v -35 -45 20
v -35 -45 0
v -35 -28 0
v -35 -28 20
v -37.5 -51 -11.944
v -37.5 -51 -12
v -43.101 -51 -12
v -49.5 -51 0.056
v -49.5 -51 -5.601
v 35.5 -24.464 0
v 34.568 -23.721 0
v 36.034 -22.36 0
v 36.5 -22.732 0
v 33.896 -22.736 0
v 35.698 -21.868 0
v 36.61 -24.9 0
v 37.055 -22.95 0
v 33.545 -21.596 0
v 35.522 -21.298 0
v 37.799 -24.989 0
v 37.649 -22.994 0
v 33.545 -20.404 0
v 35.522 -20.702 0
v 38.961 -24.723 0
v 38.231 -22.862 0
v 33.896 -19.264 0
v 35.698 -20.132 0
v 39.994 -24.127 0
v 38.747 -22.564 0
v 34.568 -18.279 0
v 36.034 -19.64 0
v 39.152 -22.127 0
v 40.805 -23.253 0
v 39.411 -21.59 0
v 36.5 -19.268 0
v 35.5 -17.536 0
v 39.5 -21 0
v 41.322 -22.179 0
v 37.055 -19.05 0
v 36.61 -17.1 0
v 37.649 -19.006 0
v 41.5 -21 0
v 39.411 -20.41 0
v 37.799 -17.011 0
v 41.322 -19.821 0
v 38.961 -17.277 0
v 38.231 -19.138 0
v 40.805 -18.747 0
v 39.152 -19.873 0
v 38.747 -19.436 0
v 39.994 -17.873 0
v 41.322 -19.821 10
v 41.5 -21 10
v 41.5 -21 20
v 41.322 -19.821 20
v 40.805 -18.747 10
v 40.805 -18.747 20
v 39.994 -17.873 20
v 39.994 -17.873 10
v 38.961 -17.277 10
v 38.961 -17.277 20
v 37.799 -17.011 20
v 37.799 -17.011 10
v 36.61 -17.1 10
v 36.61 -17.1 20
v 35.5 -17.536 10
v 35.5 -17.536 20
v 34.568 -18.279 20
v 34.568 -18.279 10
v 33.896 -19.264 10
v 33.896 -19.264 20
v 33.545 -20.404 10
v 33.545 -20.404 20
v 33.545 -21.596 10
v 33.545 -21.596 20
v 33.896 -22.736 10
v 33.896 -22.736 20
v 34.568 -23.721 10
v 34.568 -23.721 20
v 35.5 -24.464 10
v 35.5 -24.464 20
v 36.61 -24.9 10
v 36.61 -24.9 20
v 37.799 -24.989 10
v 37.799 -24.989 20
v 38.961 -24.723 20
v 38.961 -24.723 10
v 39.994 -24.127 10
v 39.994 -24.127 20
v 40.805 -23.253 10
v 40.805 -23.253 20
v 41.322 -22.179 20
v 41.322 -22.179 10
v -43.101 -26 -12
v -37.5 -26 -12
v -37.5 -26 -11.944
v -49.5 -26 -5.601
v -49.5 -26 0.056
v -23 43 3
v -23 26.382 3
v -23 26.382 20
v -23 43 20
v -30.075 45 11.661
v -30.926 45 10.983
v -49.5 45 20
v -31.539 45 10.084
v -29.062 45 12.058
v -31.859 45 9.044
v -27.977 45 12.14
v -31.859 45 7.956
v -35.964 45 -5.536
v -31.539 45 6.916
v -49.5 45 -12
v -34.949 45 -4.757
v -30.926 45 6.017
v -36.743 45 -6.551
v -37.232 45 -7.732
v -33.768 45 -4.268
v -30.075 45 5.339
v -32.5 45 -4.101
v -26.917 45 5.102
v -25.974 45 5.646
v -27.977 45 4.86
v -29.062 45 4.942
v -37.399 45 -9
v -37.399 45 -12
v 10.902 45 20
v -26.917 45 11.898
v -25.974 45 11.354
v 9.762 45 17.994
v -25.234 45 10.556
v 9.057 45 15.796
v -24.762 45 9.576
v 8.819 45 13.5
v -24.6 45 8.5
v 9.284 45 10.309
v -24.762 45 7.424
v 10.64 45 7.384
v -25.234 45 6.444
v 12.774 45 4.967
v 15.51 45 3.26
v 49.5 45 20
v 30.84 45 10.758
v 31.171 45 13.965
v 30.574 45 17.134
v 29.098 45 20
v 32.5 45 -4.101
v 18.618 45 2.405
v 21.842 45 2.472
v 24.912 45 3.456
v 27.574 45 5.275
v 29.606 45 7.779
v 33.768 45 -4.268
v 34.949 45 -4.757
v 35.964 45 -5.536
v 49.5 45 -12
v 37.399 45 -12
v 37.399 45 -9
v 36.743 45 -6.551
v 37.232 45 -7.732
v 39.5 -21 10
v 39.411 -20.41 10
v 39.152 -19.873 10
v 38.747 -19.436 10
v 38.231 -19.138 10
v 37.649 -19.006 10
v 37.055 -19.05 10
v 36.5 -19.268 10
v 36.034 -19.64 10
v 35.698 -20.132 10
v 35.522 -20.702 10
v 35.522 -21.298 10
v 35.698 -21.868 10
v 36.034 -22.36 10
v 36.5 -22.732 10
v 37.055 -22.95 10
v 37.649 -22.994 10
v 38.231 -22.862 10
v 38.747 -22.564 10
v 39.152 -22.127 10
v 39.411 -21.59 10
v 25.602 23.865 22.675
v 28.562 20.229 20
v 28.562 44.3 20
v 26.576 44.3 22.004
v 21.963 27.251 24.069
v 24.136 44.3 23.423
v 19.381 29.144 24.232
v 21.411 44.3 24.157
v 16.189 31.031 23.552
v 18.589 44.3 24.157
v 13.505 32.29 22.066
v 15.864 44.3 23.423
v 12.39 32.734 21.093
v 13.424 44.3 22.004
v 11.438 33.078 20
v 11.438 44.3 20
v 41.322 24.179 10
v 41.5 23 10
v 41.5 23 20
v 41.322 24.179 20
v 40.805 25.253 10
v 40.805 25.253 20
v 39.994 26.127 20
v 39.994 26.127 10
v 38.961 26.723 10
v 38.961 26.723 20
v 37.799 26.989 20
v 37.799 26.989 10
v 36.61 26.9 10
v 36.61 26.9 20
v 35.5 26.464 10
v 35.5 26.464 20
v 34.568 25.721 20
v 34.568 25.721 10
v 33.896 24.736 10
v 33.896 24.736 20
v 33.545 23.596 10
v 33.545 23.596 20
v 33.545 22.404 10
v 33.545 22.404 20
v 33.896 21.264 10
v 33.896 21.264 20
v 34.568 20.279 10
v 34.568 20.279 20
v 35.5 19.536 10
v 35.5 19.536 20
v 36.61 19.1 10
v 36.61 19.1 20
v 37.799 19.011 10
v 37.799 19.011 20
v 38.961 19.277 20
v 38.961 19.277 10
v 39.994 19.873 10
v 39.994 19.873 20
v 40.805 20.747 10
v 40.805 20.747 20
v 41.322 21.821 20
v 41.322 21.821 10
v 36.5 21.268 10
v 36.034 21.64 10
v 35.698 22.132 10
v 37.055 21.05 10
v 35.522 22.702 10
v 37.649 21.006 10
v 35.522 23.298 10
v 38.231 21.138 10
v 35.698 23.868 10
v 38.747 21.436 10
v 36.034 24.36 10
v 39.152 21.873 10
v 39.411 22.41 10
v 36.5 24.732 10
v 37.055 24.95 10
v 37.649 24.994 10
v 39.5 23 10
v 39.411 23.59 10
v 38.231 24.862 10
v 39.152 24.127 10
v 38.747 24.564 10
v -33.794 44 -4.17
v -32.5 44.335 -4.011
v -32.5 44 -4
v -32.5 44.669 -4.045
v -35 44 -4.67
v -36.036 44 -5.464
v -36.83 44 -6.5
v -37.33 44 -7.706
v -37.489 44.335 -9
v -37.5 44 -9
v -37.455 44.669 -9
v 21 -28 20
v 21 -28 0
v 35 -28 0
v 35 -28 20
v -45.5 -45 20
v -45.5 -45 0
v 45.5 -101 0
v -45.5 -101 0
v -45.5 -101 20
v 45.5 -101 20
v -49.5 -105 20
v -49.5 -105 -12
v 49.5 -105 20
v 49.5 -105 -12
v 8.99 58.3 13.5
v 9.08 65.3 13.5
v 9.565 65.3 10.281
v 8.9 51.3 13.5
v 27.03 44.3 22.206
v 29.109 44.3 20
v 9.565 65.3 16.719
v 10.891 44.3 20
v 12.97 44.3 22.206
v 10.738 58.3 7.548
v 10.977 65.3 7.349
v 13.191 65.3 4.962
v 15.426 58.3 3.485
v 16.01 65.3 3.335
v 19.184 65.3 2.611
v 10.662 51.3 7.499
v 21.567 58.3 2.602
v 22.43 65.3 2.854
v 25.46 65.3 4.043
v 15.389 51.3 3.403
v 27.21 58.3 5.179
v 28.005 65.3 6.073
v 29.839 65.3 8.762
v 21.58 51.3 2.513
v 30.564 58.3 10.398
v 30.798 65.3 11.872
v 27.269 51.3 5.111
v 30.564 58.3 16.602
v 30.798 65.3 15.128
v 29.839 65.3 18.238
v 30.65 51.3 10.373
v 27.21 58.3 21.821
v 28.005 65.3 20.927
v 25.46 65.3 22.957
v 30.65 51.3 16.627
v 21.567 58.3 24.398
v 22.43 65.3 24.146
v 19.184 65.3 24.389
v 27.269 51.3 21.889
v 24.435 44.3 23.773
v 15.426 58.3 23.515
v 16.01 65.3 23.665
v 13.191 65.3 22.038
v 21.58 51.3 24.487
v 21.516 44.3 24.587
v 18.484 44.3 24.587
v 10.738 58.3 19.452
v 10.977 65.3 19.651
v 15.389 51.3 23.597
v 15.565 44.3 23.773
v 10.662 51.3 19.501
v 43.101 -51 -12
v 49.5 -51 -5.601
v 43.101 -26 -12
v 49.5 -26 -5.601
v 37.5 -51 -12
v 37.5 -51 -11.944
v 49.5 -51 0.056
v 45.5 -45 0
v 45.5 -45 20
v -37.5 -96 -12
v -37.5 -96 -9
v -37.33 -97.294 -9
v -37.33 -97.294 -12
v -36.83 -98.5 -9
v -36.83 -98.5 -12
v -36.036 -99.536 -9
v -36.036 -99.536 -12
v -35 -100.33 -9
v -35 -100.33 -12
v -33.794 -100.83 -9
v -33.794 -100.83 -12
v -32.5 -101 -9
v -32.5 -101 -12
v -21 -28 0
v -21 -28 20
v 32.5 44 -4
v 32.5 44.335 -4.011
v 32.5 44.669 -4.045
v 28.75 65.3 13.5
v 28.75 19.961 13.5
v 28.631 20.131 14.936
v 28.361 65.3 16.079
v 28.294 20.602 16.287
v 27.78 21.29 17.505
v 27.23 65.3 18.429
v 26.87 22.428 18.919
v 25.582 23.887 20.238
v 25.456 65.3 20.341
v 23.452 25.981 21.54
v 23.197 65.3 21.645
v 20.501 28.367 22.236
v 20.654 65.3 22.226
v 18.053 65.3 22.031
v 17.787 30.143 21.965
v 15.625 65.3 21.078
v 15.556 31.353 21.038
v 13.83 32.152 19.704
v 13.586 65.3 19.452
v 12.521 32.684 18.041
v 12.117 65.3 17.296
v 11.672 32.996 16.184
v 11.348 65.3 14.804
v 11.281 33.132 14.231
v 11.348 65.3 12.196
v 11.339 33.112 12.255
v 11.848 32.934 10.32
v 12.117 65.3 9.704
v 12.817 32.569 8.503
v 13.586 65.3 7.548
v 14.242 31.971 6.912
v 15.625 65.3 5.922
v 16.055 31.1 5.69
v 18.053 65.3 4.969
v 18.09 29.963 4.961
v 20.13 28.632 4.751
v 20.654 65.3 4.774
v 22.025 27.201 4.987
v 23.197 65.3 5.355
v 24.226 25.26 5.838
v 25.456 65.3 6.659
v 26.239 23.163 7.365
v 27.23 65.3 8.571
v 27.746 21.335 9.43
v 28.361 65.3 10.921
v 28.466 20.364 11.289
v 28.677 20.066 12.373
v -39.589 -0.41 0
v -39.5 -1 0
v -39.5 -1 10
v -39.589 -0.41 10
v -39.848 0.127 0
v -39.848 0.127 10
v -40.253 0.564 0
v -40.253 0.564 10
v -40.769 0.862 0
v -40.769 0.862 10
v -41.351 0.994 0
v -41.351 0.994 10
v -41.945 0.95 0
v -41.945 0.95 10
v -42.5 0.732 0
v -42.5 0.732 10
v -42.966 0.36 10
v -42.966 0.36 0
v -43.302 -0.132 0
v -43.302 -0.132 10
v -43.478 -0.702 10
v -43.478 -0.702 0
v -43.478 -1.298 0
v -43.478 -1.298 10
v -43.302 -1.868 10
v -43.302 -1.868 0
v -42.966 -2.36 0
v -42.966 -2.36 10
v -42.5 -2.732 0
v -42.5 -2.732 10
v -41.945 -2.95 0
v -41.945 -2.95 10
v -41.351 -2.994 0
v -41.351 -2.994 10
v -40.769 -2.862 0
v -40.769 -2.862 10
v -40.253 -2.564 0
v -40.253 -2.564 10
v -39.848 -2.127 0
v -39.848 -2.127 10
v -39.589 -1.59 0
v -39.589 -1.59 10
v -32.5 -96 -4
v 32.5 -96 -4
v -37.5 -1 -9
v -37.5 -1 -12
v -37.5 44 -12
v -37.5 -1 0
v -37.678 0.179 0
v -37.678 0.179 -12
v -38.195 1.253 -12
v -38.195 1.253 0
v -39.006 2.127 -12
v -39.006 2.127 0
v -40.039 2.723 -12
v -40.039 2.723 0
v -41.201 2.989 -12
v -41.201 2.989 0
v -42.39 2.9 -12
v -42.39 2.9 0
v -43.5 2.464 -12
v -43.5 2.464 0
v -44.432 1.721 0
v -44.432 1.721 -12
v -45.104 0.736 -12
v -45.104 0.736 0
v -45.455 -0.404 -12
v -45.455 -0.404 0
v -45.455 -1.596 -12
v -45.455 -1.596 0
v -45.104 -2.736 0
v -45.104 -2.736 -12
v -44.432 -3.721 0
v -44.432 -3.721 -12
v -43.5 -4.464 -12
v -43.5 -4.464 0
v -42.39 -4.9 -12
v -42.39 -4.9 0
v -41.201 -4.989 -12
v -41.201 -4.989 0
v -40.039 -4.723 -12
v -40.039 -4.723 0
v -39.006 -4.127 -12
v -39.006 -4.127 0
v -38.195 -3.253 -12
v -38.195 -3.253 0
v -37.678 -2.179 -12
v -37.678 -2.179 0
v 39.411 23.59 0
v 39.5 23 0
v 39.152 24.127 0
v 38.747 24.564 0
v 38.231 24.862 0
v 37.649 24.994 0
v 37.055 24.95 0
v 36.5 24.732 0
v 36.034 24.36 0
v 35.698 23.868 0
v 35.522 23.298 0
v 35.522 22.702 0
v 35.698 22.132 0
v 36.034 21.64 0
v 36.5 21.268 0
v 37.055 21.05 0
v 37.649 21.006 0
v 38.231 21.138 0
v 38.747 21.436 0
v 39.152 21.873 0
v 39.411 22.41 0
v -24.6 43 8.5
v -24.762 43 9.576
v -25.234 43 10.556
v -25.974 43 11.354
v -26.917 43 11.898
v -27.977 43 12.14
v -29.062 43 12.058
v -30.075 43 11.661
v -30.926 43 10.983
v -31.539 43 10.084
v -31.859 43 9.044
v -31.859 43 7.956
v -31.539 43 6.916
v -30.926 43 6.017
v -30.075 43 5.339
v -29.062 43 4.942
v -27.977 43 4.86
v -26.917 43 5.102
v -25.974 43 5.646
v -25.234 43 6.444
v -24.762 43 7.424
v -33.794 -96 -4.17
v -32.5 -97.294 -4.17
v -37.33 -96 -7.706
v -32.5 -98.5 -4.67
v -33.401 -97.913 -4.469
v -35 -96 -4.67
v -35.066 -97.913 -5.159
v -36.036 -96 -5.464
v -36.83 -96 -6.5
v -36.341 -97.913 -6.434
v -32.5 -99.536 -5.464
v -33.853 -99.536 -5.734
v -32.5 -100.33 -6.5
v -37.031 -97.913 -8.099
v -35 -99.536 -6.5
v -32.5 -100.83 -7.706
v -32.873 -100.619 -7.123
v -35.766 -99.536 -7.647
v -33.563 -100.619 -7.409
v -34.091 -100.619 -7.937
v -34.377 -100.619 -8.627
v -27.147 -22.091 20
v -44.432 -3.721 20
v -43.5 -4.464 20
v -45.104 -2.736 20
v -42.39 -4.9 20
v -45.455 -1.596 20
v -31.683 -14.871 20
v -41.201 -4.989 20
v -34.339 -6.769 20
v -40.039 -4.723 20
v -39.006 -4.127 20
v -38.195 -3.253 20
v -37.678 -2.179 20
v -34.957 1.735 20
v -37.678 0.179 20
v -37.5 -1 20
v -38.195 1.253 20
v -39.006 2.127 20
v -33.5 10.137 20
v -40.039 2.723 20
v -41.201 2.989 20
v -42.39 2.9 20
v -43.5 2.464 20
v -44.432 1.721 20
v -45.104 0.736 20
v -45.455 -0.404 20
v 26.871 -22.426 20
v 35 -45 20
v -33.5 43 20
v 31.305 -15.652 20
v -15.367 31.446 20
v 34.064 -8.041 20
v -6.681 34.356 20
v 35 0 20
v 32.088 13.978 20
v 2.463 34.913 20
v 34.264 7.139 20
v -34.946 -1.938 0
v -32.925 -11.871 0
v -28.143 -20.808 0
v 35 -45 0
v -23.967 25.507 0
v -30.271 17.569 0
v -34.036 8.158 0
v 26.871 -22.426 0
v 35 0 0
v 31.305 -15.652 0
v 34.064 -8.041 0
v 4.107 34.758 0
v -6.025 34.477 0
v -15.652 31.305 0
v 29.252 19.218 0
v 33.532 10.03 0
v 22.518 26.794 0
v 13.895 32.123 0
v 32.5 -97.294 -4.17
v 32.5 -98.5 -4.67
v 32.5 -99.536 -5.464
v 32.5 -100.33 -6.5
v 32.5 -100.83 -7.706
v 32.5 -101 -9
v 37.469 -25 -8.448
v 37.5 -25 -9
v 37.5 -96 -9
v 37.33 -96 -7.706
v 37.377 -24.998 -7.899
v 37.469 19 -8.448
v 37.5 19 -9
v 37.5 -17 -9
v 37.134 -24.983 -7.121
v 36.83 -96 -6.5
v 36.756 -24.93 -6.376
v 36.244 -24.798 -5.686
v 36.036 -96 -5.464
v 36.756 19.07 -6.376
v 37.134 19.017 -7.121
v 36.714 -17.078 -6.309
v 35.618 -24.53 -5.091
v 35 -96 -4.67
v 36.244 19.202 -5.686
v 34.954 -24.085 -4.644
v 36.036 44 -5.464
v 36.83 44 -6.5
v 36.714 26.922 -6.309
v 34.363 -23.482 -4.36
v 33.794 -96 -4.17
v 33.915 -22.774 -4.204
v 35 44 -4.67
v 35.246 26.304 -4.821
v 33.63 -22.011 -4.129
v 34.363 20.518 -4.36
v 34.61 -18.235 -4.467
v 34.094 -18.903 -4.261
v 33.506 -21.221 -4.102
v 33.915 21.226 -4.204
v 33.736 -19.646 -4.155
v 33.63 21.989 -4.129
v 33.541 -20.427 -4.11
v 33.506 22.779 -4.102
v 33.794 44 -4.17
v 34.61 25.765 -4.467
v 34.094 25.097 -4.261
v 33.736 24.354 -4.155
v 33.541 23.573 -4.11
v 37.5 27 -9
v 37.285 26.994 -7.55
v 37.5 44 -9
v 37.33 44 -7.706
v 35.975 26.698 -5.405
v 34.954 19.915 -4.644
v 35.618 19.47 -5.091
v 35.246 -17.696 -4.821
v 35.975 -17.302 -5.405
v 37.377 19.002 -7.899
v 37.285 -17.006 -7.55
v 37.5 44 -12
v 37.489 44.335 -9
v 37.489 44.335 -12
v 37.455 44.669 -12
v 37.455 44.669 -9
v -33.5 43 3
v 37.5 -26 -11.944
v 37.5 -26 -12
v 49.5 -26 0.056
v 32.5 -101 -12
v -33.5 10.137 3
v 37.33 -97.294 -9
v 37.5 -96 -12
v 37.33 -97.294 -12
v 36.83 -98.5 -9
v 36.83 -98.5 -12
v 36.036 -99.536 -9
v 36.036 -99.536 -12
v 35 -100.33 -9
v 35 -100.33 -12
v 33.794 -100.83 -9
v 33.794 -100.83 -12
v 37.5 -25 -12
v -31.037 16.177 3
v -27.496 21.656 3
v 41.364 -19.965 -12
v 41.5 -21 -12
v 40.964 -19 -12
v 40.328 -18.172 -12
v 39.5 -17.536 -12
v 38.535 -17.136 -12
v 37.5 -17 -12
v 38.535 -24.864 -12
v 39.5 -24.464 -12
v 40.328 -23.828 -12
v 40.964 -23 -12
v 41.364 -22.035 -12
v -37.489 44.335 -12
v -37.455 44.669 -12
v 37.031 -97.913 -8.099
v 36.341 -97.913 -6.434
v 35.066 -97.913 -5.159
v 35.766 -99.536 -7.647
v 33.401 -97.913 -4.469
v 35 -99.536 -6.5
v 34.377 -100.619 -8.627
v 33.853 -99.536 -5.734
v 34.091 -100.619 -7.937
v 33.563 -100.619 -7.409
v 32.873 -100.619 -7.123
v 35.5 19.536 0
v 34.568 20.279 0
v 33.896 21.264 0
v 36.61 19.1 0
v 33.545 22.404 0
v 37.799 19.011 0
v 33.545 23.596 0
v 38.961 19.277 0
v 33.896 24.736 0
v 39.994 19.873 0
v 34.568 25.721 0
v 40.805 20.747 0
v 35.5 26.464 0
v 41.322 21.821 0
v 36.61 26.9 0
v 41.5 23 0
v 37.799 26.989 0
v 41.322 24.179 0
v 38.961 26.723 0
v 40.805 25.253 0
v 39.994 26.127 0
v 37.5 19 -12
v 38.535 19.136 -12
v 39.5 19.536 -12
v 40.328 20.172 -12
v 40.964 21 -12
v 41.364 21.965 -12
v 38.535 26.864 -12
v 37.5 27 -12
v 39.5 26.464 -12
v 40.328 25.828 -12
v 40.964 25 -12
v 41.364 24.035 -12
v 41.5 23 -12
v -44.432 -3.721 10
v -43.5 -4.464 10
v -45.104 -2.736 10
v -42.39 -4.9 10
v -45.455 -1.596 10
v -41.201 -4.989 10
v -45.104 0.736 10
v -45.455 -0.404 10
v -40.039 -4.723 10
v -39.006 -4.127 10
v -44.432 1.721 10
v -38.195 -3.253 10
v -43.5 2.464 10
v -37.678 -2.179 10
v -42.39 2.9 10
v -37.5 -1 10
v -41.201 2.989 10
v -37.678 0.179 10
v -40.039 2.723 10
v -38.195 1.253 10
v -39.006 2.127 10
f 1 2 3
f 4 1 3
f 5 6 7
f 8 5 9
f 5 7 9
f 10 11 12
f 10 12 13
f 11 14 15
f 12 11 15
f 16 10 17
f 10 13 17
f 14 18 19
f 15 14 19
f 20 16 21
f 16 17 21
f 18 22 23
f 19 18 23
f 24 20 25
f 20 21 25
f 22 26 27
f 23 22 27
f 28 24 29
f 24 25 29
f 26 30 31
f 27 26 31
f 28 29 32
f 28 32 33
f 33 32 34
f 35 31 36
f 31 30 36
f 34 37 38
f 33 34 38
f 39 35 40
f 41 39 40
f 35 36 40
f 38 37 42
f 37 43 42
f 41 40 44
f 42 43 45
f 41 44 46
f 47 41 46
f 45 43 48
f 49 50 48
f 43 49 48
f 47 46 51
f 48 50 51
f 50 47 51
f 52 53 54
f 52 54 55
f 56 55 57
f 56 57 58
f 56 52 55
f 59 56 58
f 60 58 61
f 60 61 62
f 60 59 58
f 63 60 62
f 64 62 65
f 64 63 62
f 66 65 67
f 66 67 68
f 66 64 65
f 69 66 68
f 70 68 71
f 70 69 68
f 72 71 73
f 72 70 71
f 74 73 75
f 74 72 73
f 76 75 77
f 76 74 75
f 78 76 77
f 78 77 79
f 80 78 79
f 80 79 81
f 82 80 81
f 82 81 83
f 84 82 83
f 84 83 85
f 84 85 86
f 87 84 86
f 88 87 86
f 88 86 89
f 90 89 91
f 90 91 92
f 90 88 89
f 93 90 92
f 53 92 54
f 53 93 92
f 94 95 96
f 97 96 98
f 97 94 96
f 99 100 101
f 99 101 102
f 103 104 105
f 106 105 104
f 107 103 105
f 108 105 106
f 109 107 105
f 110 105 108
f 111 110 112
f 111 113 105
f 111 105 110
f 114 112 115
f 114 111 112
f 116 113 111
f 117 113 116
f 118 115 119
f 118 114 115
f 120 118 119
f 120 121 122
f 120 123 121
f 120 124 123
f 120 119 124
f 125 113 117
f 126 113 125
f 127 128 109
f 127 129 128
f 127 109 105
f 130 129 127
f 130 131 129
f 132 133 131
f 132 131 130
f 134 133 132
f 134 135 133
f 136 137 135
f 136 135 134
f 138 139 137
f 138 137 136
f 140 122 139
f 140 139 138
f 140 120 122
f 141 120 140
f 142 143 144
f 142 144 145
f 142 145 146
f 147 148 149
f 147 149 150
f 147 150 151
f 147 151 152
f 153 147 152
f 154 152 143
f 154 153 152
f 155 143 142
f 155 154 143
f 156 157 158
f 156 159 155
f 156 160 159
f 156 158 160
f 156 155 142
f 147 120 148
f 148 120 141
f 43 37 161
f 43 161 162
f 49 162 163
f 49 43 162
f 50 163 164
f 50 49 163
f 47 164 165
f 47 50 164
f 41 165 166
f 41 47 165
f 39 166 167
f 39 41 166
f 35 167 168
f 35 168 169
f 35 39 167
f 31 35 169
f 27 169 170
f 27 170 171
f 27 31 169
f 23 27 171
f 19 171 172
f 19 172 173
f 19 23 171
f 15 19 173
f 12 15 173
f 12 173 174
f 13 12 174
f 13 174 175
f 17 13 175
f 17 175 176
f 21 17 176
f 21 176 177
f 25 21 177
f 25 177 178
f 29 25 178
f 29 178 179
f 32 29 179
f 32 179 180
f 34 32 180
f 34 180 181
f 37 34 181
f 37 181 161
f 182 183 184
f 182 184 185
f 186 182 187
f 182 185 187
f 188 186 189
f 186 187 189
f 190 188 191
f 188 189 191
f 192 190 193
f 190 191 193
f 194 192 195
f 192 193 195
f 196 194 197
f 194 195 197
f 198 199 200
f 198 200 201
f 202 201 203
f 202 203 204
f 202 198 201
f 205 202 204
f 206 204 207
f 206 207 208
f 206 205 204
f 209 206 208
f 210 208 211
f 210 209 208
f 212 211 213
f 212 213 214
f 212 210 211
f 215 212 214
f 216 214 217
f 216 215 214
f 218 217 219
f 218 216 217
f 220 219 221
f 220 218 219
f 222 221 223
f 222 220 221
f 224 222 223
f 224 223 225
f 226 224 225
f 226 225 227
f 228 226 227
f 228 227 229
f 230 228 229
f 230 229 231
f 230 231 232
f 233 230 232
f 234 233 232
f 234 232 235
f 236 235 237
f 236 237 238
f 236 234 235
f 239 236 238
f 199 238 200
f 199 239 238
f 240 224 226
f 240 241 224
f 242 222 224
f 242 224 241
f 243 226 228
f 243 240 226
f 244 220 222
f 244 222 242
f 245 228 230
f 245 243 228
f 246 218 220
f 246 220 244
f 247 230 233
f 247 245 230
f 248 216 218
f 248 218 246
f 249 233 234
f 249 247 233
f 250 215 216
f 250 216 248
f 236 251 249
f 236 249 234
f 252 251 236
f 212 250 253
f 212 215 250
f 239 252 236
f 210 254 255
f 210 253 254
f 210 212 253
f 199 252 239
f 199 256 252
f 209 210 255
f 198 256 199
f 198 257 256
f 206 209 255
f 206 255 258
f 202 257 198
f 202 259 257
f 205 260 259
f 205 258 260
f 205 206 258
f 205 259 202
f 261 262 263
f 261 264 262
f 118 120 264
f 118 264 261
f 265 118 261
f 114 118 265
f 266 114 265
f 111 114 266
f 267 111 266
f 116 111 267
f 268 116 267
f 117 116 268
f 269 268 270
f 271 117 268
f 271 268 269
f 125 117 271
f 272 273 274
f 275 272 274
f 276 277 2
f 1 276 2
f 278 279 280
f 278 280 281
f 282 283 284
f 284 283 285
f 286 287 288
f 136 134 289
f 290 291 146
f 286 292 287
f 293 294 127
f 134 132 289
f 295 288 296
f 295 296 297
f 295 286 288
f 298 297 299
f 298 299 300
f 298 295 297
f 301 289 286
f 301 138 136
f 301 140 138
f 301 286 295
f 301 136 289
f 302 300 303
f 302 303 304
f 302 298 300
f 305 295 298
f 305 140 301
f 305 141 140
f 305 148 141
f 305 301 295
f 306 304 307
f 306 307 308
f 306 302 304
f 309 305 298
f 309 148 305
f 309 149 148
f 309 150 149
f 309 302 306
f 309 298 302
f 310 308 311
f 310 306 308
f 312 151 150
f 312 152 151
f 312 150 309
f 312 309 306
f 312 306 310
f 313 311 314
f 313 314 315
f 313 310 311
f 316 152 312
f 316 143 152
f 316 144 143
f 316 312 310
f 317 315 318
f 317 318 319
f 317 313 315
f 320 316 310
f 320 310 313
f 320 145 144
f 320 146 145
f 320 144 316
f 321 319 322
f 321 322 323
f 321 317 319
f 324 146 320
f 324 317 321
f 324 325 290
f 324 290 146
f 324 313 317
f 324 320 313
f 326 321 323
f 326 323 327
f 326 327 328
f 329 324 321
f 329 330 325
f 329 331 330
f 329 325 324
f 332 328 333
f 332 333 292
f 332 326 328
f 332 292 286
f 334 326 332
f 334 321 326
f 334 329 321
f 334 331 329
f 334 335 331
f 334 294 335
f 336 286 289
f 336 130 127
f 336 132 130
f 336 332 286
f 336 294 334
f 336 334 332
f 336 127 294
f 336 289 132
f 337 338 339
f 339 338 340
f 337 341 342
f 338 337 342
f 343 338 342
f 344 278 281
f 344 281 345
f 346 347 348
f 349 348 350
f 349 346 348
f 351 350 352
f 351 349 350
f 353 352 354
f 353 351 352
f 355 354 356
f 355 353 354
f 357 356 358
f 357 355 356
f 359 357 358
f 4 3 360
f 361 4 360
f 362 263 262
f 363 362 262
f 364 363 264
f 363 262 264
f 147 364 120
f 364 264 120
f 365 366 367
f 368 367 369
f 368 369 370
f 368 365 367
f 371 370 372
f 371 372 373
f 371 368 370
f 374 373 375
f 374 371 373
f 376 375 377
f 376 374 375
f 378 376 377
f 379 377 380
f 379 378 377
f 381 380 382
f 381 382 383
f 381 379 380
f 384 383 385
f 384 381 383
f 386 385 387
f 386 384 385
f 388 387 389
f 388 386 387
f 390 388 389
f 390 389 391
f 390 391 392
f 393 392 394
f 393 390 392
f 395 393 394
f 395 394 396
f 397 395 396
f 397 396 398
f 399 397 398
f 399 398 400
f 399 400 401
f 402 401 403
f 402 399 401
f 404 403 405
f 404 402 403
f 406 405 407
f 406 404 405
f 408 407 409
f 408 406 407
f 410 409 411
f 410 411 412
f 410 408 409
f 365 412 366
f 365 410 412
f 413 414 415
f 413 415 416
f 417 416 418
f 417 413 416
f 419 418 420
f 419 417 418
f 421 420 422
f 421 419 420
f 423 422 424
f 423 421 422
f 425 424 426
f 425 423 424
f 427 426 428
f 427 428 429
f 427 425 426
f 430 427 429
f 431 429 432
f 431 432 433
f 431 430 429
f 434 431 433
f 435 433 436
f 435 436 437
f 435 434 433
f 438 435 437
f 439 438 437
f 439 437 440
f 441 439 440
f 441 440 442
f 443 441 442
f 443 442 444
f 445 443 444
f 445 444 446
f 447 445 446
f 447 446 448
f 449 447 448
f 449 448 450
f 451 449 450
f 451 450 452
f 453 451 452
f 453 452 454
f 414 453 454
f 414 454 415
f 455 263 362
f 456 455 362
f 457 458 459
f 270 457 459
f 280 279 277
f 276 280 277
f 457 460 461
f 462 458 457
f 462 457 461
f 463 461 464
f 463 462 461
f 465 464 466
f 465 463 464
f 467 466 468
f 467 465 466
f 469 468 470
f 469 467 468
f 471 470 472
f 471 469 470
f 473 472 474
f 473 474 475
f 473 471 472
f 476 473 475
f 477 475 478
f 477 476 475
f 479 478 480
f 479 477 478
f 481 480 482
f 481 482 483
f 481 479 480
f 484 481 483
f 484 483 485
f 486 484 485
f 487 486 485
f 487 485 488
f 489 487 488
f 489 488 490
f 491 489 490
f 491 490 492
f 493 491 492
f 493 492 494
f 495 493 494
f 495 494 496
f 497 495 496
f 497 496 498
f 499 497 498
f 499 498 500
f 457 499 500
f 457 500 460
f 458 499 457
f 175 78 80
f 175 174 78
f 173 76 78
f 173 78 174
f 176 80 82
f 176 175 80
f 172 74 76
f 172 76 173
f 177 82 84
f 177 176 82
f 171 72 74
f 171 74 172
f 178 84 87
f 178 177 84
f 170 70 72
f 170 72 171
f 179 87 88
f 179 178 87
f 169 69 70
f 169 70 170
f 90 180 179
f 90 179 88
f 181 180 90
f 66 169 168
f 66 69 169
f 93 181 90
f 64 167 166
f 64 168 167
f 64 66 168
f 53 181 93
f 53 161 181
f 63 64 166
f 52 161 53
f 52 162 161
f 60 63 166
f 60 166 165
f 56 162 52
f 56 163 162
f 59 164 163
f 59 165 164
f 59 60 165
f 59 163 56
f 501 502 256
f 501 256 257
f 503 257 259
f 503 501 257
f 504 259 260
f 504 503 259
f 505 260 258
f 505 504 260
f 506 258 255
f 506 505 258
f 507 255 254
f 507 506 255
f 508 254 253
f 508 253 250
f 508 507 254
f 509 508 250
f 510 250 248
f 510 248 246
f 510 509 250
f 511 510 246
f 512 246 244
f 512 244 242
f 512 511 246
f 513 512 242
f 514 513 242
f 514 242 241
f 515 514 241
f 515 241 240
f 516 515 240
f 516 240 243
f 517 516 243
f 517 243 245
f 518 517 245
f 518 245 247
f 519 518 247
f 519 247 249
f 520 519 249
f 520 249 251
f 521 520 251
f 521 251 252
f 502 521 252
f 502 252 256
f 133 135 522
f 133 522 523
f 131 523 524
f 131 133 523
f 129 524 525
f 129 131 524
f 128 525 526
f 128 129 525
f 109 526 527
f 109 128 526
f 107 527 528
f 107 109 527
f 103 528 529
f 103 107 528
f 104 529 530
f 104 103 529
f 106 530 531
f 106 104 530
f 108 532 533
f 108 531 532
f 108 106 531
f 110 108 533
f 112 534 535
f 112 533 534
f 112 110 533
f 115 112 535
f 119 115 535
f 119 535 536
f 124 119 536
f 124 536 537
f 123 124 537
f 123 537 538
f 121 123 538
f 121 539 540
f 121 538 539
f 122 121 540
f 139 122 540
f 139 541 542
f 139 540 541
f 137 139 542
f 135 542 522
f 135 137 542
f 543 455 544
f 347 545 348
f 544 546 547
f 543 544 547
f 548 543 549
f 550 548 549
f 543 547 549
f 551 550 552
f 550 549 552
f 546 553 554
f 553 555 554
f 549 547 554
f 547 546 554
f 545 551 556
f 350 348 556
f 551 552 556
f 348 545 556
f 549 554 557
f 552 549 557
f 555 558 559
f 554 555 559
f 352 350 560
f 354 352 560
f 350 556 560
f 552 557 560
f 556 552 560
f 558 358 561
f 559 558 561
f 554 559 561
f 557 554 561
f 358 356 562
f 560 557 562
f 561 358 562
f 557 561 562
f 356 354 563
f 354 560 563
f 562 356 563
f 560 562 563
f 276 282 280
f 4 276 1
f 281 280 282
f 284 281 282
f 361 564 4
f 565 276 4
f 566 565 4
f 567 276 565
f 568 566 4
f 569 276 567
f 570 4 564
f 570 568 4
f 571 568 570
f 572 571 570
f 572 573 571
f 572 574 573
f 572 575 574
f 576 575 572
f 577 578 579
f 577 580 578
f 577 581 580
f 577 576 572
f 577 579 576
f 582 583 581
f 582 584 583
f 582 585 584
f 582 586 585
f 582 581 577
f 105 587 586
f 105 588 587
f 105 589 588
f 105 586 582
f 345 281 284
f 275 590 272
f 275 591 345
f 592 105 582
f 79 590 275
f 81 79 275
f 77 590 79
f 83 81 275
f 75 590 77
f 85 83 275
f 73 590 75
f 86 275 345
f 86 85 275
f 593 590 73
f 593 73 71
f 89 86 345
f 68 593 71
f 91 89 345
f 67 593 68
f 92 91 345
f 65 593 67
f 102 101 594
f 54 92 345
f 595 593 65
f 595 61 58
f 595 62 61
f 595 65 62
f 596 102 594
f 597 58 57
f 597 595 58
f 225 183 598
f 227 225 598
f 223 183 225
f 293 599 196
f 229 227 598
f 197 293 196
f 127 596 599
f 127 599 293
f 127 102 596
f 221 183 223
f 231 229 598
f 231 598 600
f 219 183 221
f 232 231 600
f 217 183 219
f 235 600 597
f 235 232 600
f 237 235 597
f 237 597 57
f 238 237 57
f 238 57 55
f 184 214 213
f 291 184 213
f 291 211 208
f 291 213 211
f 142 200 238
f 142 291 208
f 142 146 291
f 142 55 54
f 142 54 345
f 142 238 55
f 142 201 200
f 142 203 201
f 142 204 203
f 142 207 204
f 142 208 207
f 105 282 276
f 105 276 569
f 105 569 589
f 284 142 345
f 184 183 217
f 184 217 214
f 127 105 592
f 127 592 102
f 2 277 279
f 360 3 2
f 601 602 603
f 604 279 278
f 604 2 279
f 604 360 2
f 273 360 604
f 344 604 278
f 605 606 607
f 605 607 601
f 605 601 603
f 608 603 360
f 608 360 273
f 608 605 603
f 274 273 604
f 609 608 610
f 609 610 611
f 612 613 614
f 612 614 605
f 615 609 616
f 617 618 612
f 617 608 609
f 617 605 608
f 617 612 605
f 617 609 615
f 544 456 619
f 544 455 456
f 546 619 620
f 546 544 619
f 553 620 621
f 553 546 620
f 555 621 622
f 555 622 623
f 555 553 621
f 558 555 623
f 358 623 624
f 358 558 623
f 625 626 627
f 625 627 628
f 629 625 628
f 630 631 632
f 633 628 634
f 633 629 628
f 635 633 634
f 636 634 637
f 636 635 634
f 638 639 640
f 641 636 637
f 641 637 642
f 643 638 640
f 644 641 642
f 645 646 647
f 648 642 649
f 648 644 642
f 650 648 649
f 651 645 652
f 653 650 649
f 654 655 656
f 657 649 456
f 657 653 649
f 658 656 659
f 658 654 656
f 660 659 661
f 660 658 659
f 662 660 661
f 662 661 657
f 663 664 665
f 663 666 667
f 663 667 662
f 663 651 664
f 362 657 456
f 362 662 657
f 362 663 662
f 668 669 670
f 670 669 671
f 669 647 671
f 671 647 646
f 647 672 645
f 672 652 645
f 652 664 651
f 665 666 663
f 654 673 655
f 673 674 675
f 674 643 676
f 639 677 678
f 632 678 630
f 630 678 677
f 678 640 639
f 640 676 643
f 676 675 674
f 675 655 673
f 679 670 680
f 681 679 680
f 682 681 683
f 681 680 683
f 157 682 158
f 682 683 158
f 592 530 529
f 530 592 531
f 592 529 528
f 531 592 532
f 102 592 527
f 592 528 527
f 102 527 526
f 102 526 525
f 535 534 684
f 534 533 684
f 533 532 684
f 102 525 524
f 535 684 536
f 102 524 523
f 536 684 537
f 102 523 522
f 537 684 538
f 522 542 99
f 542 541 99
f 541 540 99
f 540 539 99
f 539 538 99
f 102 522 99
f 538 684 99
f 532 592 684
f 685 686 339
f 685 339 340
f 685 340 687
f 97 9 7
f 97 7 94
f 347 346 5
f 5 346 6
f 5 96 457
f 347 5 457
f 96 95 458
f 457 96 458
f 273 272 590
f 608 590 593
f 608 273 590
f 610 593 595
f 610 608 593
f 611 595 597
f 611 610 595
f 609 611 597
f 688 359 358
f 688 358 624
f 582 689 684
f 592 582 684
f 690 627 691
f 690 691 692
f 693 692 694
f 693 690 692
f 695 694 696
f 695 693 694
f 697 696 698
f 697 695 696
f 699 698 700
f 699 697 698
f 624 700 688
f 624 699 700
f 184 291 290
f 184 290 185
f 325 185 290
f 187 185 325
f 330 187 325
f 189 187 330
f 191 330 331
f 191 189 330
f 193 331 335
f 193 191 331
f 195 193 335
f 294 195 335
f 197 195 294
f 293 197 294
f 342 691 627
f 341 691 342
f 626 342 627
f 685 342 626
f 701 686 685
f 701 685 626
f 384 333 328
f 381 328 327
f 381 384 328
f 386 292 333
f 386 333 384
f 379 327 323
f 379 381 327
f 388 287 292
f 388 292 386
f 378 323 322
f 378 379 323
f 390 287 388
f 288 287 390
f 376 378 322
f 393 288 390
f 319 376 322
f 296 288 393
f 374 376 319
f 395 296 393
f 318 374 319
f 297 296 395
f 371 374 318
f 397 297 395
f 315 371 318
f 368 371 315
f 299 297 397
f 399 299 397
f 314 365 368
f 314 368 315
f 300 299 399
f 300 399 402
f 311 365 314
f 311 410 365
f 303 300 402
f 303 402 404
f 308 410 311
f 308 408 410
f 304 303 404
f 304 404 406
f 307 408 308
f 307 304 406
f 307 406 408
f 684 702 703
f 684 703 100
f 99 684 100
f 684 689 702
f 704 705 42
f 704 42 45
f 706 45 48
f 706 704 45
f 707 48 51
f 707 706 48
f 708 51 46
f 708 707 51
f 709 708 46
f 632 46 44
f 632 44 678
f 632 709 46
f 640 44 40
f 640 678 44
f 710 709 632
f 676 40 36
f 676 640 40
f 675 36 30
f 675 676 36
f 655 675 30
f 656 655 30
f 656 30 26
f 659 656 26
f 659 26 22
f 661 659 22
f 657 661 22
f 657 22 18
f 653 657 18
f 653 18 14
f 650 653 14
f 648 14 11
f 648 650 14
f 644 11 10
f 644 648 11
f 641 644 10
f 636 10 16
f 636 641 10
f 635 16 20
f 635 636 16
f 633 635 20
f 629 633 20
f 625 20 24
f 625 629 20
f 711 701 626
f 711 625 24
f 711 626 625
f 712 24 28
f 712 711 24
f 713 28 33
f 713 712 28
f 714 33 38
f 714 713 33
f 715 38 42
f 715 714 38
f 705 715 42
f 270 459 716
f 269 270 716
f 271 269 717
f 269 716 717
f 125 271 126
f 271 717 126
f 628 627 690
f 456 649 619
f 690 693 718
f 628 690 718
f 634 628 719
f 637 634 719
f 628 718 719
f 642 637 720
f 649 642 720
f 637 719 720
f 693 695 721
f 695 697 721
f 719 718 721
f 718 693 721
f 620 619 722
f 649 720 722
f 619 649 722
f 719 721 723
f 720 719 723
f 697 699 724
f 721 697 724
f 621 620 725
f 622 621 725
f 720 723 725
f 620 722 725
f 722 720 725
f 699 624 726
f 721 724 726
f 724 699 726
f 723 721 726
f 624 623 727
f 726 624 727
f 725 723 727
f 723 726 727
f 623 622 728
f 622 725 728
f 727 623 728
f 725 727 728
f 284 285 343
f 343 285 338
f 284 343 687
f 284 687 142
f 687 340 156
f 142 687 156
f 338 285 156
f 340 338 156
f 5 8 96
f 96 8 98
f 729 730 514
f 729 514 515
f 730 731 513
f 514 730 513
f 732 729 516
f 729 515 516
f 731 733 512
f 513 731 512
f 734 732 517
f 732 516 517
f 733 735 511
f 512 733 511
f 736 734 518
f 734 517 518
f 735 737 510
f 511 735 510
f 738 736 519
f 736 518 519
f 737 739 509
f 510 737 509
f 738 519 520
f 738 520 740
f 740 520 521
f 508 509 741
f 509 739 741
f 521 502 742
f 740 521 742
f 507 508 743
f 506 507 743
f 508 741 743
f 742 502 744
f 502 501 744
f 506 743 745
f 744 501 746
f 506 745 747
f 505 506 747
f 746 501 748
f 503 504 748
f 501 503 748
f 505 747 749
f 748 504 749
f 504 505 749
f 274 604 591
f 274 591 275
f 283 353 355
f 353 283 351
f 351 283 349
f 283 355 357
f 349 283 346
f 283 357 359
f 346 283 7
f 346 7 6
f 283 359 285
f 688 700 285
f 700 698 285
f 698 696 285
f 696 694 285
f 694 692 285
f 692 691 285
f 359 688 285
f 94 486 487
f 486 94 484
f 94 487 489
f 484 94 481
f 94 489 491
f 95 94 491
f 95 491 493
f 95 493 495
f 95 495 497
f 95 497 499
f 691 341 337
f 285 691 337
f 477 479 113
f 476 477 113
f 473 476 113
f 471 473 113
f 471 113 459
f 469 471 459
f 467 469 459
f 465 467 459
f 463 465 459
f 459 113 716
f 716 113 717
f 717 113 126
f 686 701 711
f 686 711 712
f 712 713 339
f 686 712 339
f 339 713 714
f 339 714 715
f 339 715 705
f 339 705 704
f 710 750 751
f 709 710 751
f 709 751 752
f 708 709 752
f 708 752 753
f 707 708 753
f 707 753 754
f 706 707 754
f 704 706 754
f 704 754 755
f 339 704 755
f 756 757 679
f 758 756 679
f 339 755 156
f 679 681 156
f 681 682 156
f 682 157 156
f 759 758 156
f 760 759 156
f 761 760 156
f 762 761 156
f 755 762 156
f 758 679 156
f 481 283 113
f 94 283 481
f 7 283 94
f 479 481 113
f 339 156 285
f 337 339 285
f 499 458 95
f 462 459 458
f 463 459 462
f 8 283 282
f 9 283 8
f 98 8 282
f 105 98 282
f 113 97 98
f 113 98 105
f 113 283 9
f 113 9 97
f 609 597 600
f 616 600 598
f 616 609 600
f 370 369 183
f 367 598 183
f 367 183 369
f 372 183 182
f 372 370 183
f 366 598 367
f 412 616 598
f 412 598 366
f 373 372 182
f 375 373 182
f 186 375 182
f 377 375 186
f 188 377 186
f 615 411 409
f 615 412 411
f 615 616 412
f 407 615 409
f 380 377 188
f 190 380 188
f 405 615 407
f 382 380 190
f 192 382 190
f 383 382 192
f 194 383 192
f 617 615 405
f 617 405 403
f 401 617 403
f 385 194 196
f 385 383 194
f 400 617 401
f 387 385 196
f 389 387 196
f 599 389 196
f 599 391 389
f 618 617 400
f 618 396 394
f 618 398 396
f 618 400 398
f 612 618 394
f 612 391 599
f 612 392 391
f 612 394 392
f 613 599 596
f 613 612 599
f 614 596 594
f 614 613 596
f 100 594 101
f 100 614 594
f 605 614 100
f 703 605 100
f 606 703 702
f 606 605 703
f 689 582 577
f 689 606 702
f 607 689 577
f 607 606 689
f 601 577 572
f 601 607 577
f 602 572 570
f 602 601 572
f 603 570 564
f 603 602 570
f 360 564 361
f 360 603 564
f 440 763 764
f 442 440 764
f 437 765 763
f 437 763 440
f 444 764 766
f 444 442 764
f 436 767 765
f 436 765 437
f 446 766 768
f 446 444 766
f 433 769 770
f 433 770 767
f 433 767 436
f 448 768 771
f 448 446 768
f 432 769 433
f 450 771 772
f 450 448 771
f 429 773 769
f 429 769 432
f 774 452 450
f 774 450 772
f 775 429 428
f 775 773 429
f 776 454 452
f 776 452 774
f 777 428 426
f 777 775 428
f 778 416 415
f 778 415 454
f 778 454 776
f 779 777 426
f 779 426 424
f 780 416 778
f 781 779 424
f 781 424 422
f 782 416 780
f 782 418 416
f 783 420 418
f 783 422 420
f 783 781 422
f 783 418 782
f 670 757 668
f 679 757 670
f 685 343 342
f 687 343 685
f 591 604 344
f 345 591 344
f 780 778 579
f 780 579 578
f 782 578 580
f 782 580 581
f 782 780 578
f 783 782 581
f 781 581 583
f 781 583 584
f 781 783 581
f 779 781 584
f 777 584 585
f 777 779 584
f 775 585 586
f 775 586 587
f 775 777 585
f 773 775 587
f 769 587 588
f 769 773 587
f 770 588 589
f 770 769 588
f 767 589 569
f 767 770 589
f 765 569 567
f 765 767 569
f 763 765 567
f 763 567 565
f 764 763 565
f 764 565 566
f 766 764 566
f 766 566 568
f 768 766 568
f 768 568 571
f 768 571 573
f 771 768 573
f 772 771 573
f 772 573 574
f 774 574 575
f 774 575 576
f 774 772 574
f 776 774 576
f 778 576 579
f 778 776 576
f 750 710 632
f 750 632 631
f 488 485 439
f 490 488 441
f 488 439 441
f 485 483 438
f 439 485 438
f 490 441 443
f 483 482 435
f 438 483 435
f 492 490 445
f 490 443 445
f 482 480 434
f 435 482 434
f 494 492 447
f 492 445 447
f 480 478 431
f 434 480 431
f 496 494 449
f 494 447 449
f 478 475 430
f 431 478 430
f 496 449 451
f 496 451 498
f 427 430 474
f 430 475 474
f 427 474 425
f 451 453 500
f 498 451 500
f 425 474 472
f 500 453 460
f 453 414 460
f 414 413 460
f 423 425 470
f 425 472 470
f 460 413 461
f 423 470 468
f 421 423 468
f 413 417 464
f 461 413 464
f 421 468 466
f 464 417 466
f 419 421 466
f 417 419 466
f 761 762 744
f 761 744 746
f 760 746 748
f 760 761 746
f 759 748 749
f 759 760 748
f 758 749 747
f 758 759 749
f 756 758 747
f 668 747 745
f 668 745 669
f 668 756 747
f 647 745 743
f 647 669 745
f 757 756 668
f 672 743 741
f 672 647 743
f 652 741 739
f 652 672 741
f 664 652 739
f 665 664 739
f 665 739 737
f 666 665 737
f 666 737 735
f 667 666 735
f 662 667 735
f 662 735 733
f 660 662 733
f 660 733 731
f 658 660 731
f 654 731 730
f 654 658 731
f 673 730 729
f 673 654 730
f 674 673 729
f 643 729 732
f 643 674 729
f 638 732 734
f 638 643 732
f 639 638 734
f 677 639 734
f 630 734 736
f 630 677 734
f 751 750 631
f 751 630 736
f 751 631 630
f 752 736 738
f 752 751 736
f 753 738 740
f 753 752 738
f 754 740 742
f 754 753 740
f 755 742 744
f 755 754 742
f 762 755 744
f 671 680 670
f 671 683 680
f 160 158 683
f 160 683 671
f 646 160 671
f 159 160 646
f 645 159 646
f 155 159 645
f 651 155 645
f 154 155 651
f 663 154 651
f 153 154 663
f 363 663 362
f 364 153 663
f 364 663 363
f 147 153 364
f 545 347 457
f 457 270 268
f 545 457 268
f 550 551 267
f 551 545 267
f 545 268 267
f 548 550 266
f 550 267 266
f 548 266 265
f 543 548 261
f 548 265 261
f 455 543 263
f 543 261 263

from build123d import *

# Parameters (mm, degrees)
BOX006_W               = 25
BOX006_H               = 40
BOX006_DEPTH           = 4
BOX006_ROLL_ANGLE      = 45
BOX006_PLACEMENT_ANGLE = 90
BOX005_W               = 25
BOX005_H               = 40
BOX005_DEPTH           = 4
BOX005_ROLL_ANGLE      = 45
BOX005_PLACEMENT_ANGLE = 90
CYLINDER014_R          = 4
CYLINDER014_DEPTH      = 20
CYLINDER015_R          = 4
CYLINDER015_DEPTH      = 20
CYLINDER016_R          = 4
CYLINDER016_DEPTH      = 20
CYLINDER011_R          = 2
CYLINDER011_DEPTH      = 30
CYLINDER012_R          = 2
CYLINDER012_DEPTH      = 30
CYLINDER013_R          = 2
CYLINDER013_DEPTH      = 30
CYLINDER009_R          = 4
CYLINDER009_DEPTH      = 10
CYLINDER010_R          = 4
CYLINDER010_DEPTH      = 10
CYLINDER008_R          = 4
CYLINDER008_DEPTH      = 10
BOX001_W               = 70
BOX001_H               = 20
BOX001_DEPTH           = 20
BOX_W                  = 91
BOX_H                  = 56
BOX_DEPTH              = 20
BOX002_W               = 10.5
BOX002_H               = 35
BOX002_DEPTH           = 17
CYLINDER006_R          = 3.65
CYLINDER006_DEPTH      = 10
BOX003_W               = 75
BOX003_H               = 150
BOX003_DEPTH           = 25
FILLET_R               = 5
FILLET001_R            = 5
FILLET002_R            = 5
FILLET003_R            = 5
FILLET004_R            = 5
FILLET005_R            = 5
CYLINDER003_R          = 8.75
CYLINDER003_DEPTH      = 40
CYLINDER002_R          = 2
CYLINDER002_DEPTH      = 10
ARRAY_COUNT            = 3
CYLINDER001_R          = 2.25
CYLINDER001_DEPTH      = 5
CYLINDER_R             = 35
CYLINDER_DEPTH         = 18
CYLINDER004_R          = 35
CYLINDER004_DEPTH      = 25
CYLINDER005_R          = 8.75
CYLINDER005_DEPTH      = 40
CYLINDER007_R          = 10.75
CYLINDER007_DEPTH      = 40
BOX004_W               = 99
BOX004_H               = 150
BOX004_DEPTH           = 32


with BuildPart() as slot2:
    # Box006 → Box006 (new body)
    with BuildSketch(Plane.XY):
        with Locations((12.5, 20)):
            Rectangle(BOX006_W, BOX006_H)
    extrude(amount=BOX006_DEPTH)


with BuildPart() as slot2_1:
    # Box006 roll: moved
    add(slot2.part.rotate(Axis((0, 0, 0), (1, 0, 0)), BOX006_ROLL_ANGLE))


with BuildPart() as slot2_2:
    # Box006 placement: moved
    add(slot2_1.part.moved(Location((-37.422836, -44, -17.67767))).rotate(Axis((-37.422836, -44, -17.67767), (0, 0, 1)), BOX006_PLACEMENT_ANGLE))


with BuildPart() as part_mirroring:
    # Part__Mirroring: instance of Slot2
    add(slot2_2.part.mirror(Plane(origin=(0, 0, 0), x_dir=(0, -1, 0), z_dir=(1, 0, 0))))


with BuildPart() as part_mirroring_1:
    # Part__Mirroring placement: moved
    add(part_mirroring.part.moved(Location((0, -7, 0))))


with BuildPart() as strapslots:
    # Box005 → Box005 (new body)
    with BuildSketch(Plane.XY):
        with Locations((12.5, 20)):
            Rectangle(BOX005_W, BOX005_H)
    extrude(amount=BOX005_DEPTH)


with BuildPart() as strapslots_1:
    # Box005 roll: moved
    add(strapslots.part.rotate(Axis((0, 0, 0), (1, 0, 0)), BOX005_ROLL_ANGLE))


with BuildPart() as strapslots_2:
    # Box005 placement: moved
    add(strapslots_1.part.moved(Location((-37.422836, -51, -17.67767))).rotate(Axis((-37.422836, -51, -17.67767), (0, 0, 1)), BOX005_PLACEMENT_ANGLE))

    # Fusion011: union Part__Mirroring
    add(part_mirroring_1.part)


with BuildPart() as cylinder009:
    # Cylinder014 → Cylinder014 (new body)
    with BuildSketch(Plane(origin=(37.5, -21, 10), x_dir=(1, 0, 0), z_dir=(0, 0, 1))):
        Circle(CYLINDER014_R)
    extrude(amount=CYLINDER014_DEPTH)


with BuildPart() as cylinder010:
    # Cylinder015 → Cylinder015 (new body)
    with BuildSketch(Plane(origin=(37.5, 23, 10), x_dir=(1, 0, 0), z_dir=(0, 0, 1))):
        Circle(CYLINDER015_R)
    extrude(amount=CYLINDER015_DEPTH)


with BuildPart() as mounting002:
    # Cylinder016 → Cylinder016 (new body)
    with BuildSketch(Plane(origin=(-41.5, -1, 10), x_dir=(1, 0, 0), z_dir=(0, 0, 1))):
        Circle(CYLINDER016_R)
    extrude(amount=CYLINDER016_DEPTH)

    # Fusion008: union Cylinder009, Cylinder010
    add(cylinder009.part)
    add(cylinder010.part)


with BuildPart() as mounting002_1:
    # Fusion008 placement: moved
    add(mounting002.part.moved(Location((0, 0, -30))))


with BuildPart() as cylinder006:
    # Cylinder011 → Cylinder011 (new body)
    with BuildSketch(Plane(origin=(37.5, -21, 10), x_dir=(1, 0, 0), z_dir=(0, 0, 1))):
        Circle(CYLINDER011_R)
    extrude(amount=CYLINDER011_DEPTH)


with BuildPart() as cylinder007:
    # Cylinder012 → Cylinder012 (new body)
    with BuildSketch(Plane(origin=(37.5, 23, 10), x_dir=(1, 0, 0), z_dir=(0, 0, 1))):
        Circle(CYLINDER012_R)
    extrude(amount=CYLINDER012_DEPTH)


with BuildPart() as bottommounting:
    # Cylinder013 → Cylinder013 (new body)
    with BuildSketch(Plane(origin=(-41.5, -1, 10), x_dir=(1, 0, 0), z_dir=(0, 0, 1))):
        Circle(CYLINDER013_R)
    extrude(amount=CYLINDER013_DEPTH)

    # Fusion007: union Cylinder006, Cylinder007
    add(cylinder006.part)
    add(cylinder007.part)


with BuildPart() as bottommounting_1:
    # Fusion007 placement: moved
    add(bottommounting.part.moved(Location((0, 0, -30))))

    # Fusion009: union Mounting002
    add(mounting002_1.part)


with BuildPart() as cylinder004:
    # Cylinder009 → Cylinder009 (new body)
    with BuildSketch(Plane(origin=(37.5, -21, 10), x_dir=(1, 0, 0), z_dir=(0, 0, 1))):
        Circle(CYLINDER009_R)
    extrude(amount=CYLINDER009_DEPTH)


with BuildPart() as cylinder005:
    # Cylinder010 → Cylinder010 (new body)
    with BuildSketch(Plane(origin=(37.5, 23, 10), x_dir=(1, 0, 0), z_dir=(0, 0, 1))):
        Circle(CYLINDER010_R)
    extrude(amount=CYLINDER010_DEPTH)


with BuildPart() as combinedmounting:
    # Cylinder008 → Cylinder008 (new body)
    with BuildSketch(Plane(origin=(-41.5, -1, 10), x_dir=(1, 0, 0), z_dir=(0, 0, 1))):
        Circle(CYLINDER008_R)
    extrude(amount=CYLINDER008_DEPTH)

    # Fusion006: union Cylinder004, Cylinder005
    add(cylinder004.part)
    add(cylinder005.part)

    # Fusion010: union BottomMounting
    add(bottommounting_1.part)


with BuildPart() as wiringpocket:
    # Box001 → Box001 (new body)
    with BuildSketch(Plane(origin=(-35, -53, 0), x_dir=(1, 0, 0), z_dir=(0, 0, 1))):
        with Locations((35, 10)):
            Rectangle(BOX001_W, BOX001_H)
    extrude(amount=BOX001_DEPTH)


with BuildPart() as electronicspocket:
    # Box → Box (new body)
    with BuildSketch(Plane(origin=(-45.5, -106, 0), x_dir=(1, 0, 0), z_dir=(0, 0, 1))):
        with Locations((45.5, 28)):
            Rectangle(BOX_W, BOX_H)
    extrude(amount=BOX_DEPTH)

    # Fusion: union WiringPocket
    add(wiringpocket.part)


with BuildPart() as electronicspocket_1:
    # Fusion placement: moved
    add(electronicspocket.part.moved(Location((0, 5, 0))))


with BuildPart() as potentiometer:
    # Box002 → Box002 (new body)
    with BuildSketch(Plane(origin=(-30, 18, 5.5), x_dir=(1, 0, 0), z_dir=(0, 0, 1))):
        with Locations((5.25, 17.5)):
            Rectangle(BOX002_W, BOX002_H)
    extrude(amount=BOX002_DEPTH)


with BuildPart() as potpocket:
    # Cylinder006 → Cylinder006 (new body)
    with BuildSketch(Plane(origin=(-24.75, 60.5, 11), x_dir=(1, 0, 0), z_dir=(0, -1, 0))):
        Circle(CYLINDER006_R)
    extrude(amount=CYLINDER006_DEPTH)

    # Fusion001: union Potentiometer
    add(potentiometer.part)


with BuildPart() as potpocket_1:
    # Fusion001 placement: moved
    add(potpocket.part.moved(Location((-3.5, -10, -2.5))))


with BuildPart() as batterypocket:
    # Box003 → Box003 (new body)
    with BuildSketch(Plane(origin=(-37.5, -101, -29), x_dir=(1, 0, 0), z_dir=(0, 0, 1))):
        with Locations((37.5, 75)):
            Rectangle(BOX003_W, BOX003_H)
    extrude(amount=BOX003_DEPTH)

    # Fillet
    fillet_edges = [batterypocket.edges().sort_by_distance(p)[0] for p in [
        (-37.5, -26, -4),
    ]]
    fillet(fillet_edges, radius=FILLET_R)

    # Fillet001
    fillet001_edges = [batterypocket.edges().sort_by_distance(p)[0] for p in [
        (-37.5, -26, -29),
    ]]
    fillet(fillet001_edges, radius=FILLET001_R)

    # Fillet002
    fillet002_edges = [batterypocket.edges().sort_by_distance(p)[0] for p in [
        (37.5, -26, -29),
    ]]
    fillet(fillet002_edges, radius=FILLET002_R)

    # Fillet003
    fillet003_edges = [batterypocket.edges().sort_by_distance(p)[0] for p in [
        (37.5, -26, -4),
    ]]
    fillet(fillet003_edges, radius=FILLET003_R)

    # Fillet004
    fillet004_edges = [batterypocket.edges().sort_by_distance(p)[0] for p in [
        (0, 49, -29),
    ]]
    fillet(fillet004_edges, radius=FILLET004_R)

    # Fillet005
    fillet005_edges = [batterypocket.edges().sort_by_distance(p)[0] for p in [
        (37.5, -101, -16.5),
        (0, -101, -4),
        (0, -101, -29),
        (-37.5, -101, -16.5),
    ]]
    fillet(fillet005_edges, radius=FILLET005_R)


with BuildPart() as blowerinlet:
    # Cone → Cone (revolve)
    with BuildSketch(Plane(origin=(0, 0, 22.5), x_dir=(1, 0, 0), z_dir=(0, -1, 0))):
        Polygon((0, 0), (27.25, 0), (27.15, 13), (0, 13), align=None)
    revolve(axis=Axis((0, 0, 22.5), (0, 0, 1)))


with BuildPart() as bloweroutlet:
    # Cylinder003 → Cylinder003 (new body)
    with BuildSketch(Plane(origin=(20, 36.3, 13.5), x_dir=(1, 0, 0), z_dir=(0, -1, 0))):
        Circle(CYLINDER003_R)
    extrude(amount=CYLINDER003_DEPTH)


with BuildPart() as blowerfeet:
    # Cylinder002 → Cylinder002 (new body)
    with BuildSketch(Plane(origin=(0, -28.4, 0), x_dir=(1, 0, 0), z_dir=(0, 0, 1))):
        Circle(CYLINDER002_R)
    extrude(amount=CYLINDER002_DEPTH)

    # Array: BlowerFeet ×3 about axis
    array_axis = Axis((0, 0, 0), (0, 0, 1))


with BuildPart() as blowerfeet_1:
    add(blowerfeet.part)
    for i in range(1, ARRAY_COUNT):
        add(blowerfeet.part.rotate(array_axis, i * 360 / ARRAY_COUNT))


with BuildPart() as blowerendbearing:
    # Cylinder001 → Cylinder001 (new body)
    with BuildSketch(Plane.XY.offset(1)):
        Circle(CYLINDER001_R)
    extrude(amount=CYLINDER001_DEPTH)


with BuildPart() as blowerbody:
    # Cylinder → Cylinder (new body)
    with BuildSketch(Plane.XY.offset(4.5)):
        Circle(CYLINDER_R)
    extrude(amount=CYLINDER_DEPTH)


with BuildPart() as blowerpocket:
    # Cylinder004 → Cylinder004 (new body)
    with BuildSketch(Plane.XY):
        Circle(CYLINDER004_R)
    extrude(amount=CYLINDER004_DEPTH)

    # Fusion003: union BlowerInlet, BlowerOutlet, BlowerFeet, BlowerEndbearing, BlowerBody
    add(blowerinlet.part)
    add(bloweroutlet.part)
    add(blowerfeet_1.part)
    add(blowerendbearing.part)
    add(blowerbody.part)


with BuildPart() as combinedpocket:
    # Cylinder005 → Cylinder005 (new body)
    with BuildSketch(Plane(origin=(20, 65.3, 13.5), x_dir=(1, 0, 0), z_dir=(0, -1, 0))):
        Circle(CYLINDER005_R)
    extrude(amount=CYLINDER005_DEPTH)

    # Fusion004: union ElectronicsPocket, PotPocket, BatteryPocket, BlowerPocket
    add(electronicspocket_1.part)
    add(potpocket_1.part)
    add(batterypocket.part)
    add(blowerpocket.part)


with BuildPart() as housingoutlet:
    # Cylinder007 → Cylinder007 (new body)
    with BuildSketch(Plane(origin=(20, 59.3, 13.5), x_dir=(1, 0, 0), z_dir=(0, -1, 0))):
        Circle(CYLINDER007_R)
    extrude(amount=CYLINDER007_DEPTH)


with BuildPart() as housingblock:
    # Box004 → Box004 (new body)
    with BuildSketch(Plane(origin=(-49.5, -105, -12), x_dir=(1, 0, 0), z_dir=(0, 0, 1))):
        with Locations((49.5, 75)):
            Rectangle(BOX004_W, BOX004_H)
    extrude(amount=BOX004_DEPTH)


with BuildPart() as papr_lower_housing:
    # Cone001 → Cone001 (revolve)
    with BuildSketch(Plane(origin=(20, 65.3, 13.5), x_dir=(-1, 0, 0), z_dir=(0, 0, 1))):
        Polygon((0, 0), (10.92, 0), (11.19, 21), (0, 21), align=None)
    revolve(axis=Axis((20, 65.3, 13.5), (0, -1, 0)))

    # Fusion005: union HousingOutlet, HousingBlock
    add(housingoutlet.part)
    add(housingblock.part)

    # Cut: cut CombinedPocket
    add(combinedpocket.part, mode=Mode.SUBTRACT)

    # Cut001: cut CombinedMounting
    add(combinedmounting.part, mode=Mode.SUBTRACT)

    # Cut002: cut StrapSlots
    add(strapslots_2.part, mode=Mode.SUBTRACT)


solid = papr_lower_housing.part
